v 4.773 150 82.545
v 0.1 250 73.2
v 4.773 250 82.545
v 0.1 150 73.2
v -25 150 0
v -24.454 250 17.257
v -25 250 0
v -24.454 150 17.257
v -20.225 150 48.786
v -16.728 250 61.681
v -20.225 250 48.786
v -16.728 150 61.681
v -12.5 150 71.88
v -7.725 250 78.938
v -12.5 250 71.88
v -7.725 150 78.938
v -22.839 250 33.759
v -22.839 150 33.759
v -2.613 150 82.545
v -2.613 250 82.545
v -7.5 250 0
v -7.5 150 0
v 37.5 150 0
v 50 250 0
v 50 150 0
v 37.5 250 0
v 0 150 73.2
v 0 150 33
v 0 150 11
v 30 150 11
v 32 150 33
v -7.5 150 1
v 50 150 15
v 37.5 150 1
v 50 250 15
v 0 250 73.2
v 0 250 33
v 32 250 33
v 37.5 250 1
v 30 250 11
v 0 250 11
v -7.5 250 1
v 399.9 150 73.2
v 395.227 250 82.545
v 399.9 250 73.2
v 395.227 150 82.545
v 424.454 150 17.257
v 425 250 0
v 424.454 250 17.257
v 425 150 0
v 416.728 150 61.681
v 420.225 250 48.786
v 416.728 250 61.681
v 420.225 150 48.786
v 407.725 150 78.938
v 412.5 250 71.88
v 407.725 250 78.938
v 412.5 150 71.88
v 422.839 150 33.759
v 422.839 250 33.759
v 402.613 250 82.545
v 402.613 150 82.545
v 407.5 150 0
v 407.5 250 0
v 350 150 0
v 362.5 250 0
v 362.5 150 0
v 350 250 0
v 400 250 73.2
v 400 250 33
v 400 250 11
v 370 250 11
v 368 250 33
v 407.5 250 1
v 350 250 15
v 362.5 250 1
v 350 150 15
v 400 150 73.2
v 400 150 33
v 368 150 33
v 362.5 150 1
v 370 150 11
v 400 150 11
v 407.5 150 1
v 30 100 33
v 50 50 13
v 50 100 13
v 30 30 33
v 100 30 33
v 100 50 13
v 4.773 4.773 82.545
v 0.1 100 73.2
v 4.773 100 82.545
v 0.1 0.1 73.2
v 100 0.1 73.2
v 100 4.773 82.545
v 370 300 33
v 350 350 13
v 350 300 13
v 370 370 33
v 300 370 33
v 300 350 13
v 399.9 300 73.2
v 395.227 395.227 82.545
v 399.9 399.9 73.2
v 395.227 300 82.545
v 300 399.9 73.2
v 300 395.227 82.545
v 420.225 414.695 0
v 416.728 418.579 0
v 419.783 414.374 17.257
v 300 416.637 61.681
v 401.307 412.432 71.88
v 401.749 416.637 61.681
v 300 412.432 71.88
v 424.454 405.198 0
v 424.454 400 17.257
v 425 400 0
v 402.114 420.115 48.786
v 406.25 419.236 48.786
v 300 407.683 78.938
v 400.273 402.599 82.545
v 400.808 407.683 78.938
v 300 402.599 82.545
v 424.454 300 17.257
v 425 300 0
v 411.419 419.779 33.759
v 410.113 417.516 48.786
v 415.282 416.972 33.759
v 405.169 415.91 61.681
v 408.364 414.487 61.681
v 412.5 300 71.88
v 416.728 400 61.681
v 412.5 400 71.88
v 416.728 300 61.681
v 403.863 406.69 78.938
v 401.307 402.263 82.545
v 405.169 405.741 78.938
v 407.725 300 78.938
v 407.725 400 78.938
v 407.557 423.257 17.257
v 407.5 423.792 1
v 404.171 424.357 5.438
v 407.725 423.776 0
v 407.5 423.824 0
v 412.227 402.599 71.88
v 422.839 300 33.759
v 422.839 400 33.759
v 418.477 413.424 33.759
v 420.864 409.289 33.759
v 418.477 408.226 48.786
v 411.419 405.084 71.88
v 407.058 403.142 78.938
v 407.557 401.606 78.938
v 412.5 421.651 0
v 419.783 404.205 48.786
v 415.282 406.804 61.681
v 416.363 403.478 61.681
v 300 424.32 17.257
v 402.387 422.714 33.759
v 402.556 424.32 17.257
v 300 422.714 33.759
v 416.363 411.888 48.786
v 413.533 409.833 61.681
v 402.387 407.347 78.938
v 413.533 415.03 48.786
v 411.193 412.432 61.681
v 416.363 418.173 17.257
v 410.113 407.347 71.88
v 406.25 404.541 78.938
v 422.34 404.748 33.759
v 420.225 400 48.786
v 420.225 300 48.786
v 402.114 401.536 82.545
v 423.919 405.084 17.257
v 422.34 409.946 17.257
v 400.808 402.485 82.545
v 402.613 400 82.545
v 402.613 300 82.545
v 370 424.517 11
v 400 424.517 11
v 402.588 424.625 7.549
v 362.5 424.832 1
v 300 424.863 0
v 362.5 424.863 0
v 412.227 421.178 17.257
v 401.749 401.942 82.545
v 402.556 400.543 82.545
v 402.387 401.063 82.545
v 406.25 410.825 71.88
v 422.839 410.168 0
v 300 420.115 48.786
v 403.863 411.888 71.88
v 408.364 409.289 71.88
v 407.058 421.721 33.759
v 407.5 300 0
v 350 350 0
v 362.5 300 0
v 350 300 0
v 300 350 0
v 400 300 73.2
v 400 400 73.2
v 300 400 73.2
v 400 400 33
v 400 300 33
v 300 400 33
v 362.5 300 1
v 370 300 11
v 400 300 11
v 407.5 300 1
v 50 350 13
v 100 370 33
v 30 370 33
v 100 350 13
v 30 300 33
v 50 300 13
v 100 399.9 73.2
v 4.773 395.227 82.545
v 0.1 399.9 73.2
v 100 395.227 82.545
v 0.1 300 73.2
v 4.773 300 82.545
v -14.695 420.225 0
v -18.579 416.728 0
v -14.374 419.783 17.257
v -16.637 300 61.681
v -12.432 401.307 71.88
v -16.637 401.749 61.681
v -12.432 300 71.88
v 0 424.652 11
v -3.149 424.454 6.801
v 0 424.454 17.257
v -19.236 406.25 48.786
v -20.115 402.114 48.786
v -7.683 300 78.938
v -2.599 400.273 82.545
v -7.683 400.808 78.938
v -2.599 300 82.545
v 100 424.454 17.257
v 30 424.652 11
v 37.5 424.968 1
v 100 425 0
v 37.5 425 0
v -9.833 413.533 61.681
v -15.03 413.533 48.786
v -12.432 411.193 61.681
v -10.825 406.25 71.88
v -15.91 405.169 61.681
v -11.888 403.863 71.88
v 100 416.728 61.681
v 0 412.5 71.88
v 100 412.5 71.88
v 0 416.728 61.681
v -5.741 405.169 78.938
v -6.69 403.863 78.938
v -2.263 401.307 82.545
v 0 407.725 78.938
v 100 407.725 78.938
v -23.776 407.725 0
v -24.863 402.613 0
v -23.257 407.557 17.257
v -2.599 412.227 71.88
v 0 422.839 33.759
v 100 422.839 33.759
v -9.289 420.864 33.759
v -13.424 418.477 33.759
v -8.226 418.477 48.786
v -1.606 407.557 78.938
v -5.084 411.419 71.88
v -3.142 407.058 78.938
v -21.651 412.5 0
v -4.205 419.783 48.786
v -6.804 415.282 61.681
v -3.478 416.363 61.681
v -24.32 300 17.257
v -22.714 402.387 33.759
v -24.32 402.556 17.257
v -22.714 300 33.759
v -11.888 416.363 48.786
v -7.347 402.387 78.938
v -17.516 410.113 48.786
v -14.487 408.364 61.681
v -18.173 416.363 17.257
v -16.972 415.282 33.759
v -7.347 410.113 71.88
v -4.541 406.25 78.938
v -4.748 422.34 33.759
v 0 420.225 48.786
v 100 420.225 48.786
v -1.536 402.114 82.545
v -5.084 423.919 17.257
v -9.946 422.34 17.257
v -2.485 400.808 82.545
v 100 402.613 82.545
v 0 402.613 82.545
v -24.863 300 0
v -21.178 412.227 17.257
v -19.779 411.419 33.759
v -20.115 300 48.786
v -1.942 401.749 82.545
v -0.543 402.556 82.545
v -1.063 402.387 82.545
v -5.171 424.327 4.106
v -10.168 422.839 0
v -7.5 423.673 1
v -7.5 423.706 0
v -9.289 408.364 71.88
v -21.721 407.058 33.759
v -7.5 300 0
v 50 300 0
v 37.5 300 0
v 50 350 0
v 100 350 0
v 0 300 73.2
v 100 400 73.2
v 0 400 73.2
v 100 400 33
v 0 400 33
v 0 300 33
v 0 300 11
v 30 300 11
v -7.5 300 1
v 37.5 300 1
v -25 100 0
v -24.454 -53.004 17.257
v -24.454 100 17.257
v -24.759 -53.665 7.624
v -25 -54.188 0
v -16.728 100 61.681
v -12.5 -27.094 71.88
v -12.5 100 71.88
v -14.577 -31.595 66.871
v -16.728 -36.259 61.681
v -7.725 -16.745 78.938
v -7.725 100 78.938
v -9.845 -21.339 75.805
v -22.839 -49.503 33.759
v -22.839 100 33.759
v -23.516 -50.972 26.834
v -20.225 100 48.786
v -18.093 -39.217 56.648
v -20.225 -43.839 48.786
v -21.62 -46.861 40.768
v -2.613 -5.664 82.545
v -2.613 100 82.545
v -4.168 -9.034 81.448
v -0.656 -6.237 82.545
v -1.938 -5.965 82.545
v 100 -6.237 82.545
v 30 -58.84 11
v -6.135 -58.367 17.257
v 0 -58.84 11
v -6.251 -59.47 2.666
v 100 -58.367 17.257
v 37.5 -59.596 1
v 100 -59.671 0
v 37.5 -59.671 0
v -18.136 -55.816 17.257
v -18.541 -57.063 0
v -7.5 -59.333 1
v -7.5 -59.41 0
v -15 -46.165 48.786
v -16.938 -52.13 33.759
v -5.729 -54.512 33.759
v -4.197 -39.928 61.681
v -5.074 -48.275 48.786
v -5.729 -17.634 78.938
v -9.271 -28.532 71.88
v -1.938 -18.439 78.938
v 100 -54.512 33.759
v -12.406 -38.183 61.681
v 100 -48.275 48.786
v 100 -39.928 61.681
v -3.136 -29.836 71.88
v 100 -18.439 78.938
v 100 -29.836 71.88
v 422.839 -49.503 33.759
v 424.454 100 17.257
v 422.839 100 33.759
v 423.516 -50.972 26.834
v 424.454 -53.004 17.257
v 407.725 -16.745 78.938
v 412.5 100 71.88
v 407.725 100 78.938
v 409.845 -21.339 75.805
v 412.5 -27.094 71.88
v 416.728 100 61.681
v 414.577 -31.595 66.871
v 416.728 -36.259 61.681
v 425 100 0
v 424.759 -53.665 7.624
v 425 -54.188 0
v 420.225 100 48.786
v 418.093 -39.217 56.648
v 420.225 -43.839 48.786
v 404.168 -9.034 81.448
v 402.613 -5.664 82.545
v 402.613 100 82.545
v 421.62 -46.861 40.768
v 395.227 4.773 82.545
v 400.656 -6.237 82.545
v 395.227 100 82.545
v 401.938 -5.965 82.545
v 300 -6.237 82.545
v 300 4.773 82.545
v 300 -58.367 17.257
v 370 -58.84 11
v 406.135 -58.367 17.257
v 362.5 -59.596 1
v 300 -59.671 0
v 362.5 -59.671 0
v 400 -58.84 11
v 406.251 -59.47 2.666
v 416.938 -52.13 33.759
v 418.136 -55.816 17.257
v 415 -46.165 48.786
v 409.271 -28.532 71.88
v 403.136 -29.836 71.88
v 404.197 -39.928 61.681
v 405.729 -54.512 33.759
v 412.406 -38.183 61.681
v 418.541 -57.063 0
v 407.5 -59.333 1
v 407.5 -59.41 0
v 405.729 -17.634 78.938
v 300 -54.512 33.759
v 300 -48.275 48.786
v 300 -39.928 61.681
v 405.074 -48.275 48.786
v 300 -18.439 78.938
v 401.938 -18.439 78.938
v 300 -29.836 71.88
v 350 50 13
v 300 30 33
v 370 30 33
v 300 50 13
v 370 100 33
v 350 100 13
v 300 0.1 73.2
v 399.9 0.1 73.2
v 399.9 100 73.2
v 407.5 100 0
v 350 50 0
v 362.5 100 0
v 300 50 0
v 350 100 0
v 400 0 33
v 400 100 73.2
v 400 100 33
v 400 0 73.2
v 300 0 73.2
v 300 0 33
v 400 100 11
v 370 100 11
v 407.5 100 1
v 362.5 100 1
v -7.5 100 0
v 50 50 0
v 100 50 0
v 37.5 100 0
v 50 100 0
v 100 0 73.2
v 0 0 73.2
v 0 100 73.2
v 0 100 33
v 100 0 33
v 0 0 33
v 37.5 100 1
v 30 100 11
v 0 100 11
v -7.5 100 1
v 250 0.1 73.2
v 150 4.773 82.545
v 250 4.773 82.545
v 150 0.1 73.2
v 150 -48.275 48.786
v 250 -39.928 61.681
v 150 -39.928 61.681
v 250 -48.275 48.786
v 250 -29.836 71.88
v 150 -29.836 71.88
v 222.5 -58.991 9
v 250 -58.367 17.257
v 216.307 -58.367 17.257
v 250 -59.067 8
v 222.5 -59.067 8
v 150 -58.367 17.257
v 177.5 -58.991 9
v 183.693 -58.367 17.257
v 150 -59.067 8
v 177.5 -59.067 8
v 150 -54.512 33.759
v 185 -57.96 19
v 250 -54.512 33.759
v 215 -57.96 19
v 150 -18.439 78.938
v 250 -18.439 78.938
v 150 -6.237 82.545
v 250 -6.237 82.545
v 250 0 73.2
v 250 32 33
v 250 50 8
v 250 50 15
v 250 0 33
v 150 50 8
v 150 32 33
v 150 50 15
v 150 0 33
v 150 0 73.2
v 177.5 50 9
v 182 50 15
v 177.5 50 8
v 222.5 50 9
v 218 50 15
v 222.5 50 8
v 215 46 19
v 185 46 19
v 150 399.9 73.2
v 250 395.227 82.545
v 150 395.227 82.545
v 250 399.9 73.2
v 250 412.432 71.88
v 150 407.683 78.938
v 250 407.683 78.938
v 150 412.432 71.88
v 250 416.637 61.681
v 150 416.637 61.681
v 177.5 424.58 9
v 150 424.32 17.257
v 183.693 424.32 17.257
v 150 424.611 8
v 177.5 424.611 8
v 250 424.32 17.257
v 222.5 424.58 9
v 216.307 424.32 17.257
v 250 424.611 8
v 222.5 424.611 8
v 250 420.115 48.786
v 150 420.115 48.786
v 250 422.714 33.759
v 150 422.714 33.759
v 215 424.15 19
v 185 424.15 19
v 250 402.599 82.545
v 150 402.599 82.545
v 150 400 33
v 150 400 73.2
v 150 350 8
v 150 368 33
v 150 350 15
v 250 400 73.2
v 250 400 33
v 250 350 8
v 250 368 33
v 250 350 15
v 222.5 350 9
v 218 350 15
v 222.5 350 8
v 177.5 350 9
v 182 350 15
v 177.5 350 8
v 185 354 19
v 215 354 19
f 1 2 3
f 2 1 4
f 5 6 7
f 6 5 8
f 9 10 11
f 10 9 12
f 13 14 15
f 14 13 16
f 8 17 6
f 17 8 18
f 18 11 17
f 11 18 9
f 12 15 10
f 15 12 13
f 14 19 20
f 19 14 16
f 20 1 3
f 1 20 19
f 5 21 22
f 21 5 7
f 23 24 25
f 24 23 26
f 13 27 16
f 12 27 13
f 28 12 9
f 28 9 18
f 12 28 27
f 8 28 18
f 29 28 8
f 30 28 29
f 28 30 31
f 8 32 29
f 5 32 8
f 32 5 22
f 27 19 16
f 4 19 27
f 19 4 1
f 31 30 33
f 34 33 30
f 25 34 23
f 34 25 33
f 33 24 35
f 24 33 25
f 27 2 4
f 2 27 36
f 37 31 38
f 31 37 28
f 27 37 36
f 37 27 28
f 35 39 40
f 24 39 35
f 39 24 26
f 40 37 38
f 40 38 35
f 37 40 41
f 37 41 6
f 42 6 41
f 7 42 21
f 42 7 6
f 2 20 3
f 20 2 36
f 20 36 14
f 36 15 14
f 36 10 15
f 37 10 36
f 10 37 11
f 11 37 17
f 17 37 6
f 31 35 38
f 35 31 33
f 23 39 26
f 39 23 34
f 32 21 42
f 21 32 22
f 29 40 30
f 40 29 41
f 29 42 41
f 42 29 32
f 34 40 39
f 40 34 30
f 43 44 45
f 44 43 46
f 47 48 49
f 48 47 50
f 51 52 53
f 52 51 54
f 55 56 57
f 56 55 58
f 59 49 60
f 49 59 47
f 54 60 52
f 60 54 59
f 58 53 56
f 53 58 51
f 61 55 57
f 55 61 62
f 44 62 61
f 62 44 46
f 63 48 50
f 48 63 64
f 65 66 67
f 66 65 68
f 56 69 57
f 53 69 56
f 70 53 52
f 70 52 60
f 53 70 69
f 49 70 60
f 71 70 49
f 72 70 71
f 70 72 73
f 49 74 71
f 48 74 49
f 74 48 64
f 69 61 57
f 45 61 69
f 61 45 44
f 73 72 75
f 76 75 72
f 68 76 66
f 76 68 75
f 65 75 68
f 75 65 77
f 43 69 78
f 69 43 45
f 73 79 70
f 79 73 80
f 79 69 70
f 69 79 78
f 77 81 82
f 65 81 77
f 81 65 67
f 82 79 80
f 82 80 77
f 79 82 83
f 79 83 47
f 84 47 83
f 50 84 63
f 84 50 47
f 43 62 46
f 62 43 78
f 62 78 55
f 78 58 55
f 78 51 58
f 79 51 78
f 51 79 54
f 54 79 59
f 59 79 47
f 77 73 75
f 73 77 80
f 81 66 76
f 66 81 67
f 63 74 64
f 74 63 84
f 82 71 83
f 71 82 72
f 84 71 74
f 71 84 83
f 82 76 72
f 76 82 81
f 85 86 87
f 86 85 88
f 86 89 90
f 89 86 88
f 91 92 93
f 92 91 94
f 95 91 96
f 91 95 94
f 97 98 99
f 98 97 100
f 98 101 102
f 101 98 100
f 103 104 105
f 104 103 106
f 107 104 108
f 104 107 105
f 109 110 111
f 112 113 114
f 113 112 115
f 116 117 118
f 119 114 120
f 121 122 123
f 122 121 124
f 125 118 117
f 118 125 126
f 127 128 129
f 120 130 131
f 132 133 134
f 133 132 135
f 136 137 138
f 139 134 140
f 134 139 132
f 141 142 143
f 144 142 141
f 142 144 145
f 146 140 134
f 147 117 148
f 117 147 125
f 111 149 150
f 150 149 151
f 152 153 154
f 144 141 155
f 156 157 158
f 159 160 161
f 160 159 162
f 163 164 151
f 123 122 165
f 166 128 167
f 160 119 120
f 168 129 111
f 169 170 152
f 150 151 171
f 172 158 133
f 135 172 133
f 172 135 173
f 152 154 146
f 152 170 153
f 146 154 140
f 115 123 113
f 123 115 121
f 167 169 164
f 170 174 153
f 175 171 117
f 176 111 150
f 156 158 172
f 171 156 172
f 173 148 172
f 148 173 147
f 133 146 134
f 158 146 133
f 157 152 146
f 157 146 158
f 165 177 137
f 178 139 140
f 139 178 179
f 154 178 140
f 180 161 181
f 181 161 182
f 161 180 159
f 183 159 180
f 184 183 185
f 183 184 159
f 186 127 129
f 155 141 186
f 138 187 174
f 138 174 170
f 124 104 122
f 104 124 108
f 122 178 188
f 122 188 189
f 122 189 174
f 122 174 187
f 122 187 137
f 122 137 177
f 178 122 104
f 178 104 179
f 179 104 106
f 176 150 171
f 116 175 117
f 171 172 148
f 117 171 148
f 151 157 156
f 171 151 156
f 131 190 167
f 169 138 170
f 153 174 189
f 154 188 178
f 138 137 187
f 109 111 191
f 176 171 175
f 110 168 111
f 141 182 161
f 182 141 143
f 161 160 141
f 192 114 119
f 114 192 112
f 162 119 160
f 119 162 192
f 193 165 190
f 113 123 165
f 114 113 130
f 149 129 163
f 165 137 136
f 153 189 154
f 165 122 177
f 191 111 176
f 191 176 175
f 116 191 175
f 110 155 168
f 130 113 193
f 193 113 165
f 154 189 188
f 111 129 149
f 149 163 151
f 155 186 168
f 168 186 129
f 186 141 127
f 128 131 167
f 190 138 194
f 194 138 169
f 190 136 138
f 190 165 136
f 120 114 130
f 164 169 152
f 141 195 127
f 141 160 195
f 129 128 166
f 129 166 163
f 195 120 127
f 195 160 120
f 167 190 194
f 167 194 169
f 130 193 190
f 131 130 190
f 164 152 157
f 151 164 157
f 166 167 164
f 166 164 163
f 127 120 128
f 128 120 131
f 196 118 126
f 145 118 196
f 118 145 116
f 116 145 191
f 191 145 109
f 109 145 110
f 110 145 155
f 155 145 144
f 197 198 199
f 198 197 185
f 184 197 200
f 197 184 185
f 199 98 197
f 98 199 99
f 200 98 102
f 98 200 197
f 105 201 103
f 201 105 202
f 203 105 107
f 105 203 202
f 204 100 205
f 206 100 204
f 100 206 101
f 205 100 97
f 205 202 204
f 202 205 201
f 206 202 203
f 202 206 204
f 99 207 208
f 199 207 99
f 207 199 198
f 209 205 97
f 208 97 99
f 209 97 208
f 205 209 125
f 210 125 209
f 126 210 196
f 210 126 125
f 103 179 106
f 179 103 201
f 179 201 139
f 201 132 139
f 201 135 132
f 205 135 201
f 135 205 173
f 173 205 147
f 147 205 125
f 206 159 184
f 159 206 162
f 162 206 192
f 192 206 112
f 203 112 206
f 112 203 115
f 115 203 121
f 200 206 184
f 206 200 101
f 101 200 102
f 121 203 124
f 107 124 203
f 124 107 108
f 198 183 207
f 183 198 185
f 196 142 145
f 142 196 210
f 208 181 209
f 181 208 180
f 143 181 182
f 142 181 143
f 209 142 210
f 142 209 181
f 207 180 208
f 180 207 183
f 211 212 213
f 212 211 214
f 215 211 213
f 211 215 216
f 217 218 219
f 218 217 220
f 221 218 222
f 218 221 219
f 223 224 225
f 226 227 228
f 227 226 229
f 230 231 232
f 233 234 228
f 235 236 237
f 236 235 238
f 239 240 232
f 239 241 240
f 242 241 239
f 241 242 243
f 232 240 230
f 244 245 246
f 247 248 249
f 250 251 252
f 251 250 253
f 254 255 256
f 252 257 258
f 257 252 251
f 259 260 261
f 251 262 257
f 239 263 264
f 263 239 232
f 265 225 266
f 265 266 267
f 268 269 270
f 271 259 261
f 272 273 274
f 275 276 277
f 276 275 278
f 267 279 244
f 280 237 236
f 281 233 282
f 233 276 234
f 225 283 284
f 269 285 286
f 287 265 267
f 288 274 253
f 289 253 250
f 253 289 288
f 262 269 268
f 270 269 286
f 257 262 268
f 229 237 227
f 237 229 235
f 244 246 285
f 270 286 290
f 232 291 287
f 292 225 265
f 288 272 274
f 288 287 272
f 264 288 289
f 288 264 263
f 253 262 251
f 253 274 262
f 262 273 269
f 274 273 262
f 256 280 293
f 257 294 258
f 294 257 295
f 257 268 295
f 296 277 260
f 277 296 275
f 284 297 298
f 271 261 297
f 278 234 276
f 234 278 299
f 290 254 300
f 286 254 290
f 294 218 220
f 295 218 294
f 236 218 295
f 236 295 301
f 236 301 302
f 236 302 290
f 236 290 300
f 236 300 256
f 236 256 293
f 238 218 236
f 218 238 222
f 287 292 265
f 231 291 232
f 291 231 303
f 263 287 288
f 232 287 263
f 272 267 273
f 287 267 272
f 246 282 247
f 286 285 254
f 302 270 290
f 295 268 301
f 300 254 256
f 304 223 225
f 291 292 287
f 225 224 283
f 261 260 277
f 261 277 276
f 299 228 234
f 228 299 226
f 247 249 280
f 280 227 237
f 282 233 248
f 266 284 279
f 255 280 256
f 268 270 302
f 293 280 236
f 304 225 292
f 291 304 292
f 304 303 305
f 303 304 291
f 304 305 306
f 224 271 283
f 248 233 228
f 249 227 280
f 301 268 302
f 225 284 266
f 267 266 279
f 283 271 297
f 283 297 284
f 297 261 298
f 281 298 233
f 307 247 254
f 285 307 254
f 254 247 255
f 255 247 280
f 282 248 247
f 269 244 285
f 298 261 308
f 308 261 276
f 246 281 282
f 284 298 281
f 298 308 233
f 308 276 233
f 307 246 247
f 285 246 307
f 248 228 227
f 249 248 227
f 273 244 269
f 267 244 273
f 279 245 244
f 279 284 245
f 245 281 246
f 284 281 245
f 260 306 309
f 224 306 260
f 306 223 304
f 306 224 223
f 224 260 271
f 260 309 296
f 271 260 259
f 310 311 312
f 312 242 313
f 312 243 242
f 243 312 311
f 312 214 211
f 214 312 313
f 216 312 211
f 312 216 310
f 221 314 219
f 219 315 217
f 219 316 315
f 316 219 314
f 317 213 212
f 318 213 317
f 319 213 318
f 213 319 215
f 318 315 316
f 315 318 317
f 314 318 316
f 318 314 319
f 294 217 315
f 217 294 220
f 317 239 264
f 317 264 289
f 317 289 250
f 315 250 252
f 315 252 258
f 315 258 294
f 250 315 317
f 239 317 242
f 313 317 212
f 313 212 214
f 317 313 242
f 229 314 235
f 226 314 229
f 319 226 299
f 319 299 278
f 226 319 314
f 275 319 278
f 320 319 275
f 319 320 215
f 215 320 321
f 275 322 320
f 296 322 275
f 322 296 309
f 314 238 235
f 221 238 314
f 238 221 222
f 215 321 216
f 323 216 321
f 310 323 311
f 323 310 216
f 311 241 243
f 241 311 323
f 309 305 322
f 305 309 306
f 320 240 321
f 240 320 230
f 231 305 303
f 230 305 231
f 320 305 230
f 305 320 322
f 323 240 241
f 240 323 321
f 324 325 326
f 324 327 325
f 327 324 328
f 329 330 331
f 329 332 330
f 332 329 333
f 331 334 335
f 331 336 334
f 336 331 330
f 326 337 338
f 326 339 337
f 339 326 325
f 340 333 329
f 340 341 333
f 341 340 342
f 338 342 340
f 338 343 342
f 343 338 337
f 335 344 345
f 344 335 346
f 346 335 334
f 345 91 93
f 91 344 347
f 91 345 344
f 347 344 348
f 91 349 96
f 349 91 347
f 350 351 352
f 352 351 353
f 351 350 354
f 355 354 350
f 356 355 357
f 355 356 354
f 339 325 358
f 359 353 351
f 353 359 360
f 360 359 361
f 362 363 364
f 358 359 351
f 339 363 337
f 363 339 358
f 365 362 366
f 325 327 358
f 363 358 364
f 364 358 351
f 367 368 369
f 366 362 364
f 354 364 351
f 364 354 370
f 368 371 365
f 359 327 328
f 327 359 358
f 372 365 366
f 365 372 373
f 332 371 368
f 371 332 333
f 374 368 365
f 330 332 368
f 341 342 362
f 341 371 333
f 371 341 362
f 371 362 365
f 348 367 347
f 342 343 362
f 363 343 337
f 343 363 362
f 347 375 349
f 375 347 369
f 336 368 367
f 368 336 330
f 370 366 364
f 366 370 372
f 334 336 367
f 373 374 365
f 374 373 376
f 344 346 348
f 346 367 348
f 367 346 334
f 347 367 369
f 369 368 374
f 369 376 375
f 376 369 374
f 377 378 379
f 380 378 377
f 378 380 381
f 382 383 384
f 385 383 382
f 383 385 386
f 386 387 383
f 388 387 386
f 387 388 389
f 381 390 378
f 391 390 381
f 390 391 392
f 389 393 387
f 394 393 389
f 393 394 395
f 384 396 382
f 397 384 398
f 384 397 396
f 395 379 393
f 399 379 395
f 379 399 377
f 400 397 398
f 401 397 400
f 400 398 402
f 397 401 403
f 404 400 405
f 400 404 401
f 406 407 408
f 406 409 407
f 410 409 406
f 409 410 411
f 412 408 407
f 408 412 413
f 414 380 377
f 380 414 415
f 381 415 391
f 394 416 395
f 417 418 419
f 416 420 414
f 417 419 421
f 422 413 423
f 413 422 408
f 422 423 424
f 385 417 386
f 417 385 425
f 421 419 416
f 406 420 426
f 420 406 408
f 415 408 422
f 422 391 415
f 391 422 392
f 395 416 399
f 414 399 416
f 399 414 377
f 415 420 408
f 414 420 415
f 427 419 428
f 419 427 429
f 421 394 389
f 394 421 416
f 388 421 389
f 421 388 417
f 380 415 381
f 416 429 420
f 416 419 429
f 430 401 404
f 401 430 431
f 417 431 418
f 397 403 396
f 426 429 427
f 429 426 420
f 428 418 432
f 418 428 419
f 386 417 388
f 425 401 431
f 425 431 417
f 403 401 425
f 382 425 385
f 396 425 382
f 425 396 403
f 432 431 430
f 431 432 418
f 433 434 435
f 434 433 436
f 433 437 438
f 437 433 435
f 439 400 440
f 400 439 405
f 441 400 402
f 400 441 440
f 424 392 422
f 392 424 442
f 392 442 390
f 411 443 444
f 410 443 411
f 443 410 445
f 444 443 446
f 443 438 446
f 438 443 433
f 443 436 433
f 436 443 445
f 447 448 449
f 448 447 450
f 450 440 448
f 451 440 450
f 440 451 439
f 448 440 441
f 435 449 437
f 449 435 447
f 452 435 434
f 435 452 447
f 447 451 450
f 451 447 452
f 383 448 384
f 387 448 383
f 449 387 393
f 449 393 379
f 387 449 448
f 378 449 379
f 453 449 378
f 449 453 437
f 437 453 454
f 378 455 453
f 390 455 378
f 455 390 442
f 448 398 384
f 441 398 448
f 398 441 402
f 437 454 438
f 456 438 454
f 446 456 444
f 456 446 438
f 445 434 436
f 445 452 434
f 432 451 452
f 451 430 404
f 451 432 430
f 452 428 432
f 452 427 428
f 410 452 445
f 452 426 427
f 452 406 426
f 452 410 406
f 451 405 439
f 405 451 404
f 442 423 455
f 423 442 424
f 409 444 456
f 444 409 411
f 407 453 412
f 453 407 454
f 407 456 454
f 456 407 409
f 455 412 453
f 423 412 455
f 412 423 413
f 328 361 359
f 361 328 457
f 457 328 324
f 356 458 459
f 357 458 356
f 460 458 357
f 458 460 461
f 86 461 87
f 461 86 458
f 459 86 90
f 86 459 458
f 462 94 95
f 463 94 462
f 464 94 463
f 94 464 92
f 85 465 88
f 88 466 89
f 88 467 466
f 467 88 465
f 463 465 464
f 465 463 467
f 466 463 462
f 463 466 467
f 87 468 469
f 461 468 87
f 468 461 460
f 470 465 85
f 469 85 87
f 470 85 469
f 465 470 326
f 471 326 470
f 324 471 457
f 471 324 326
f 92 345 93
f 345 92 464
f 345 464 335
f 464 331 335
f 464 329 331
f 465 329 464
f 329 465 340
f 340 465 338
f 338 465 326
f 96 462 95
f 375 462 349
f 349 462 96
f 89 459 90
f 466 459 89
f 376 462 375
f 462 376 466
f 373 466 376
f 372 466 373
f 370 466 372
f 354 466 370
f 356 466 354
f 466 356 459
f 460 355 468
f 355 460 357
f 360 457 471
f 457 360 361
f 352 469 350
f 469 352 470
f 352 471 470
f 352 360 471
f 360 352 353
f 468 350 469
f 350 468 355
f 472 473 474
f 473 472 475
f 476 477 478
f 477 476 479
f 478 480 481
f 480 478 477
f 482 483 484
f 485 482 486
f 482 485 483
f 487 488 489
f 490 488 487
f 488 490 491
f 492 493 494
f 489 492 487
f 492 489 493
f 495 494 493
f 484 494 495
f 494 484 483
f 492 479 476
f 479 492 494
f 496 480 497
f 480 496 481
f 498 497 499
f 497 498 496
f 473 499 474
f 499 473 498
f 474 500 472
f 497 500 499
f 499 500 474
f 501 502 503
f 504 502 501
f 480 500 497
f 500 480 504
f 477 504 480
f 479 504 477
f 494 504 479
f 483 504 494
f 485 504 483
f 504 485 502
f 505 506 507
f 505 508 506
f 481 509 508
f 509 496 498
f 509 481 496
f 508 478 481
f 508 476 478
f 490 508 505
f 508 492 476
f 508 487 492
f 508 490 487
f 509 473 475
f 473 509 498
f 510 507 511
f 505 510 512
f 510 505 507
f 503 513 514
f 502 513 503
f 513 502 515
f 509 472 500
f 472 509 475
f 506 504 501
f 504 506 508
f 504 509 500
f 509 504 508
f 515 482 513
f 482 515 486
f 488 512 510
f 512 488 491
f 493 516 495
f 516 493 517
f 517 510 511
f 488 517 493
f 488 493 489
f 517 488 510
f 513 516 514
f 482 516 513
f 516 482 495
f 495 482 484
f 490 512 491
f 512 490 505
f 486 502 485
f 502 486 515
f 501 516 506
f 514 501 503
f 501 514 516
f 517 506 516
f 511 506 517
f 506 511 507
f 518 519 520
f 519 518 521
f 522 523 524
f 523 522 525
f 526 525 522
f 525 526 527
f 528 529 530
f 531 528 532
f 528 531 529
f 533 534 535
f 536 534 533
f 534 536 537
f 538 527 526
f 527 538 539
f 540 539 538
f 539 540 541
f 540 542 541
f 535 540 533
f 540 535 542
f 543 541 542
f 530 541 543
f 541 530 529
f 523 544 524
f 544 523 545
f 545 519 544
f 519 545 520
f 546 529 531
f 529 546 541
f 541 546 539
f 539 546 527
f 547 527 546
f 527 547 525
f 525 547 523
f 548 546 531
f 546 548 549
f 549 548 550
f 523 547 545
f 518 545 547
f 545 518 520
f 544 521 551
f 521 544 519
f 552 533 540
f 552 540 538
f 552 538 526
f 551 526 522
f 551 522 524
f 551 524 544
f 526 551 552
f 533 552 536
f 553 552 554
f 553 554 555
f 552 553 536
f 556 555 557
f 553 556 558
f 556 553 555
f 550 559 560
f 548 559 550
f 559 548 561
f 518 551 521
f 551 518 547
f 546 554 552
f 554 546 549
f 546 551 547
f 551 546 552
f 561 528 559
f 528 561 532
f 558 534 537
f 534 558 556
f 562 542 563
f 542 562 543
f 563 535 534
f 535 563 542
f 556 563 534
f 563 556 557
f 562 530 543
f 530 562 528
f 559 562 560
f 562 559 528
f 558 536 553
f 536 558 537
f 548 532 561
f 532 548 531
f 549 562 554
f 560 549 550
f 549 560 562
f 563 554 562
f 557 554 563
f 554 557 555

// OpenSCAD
$fn = 30; 
include <MCAD/2Dshapes.scad>;

preview_maly ();
//preview ();
//strana ();
//predek ();
//zadek ();
//predni_roh_P ();
//predni_roh_L ();
//zadni_roh_P ();
//zadni_roh_L ();

module preview_maly () {
	translate ([0, 150, 0]) strana ();
	translate ([400, 250, 0]) rotate ([0, 0, 180]) strana ();
	translate ([400, 400, 0]) rotate ([0, 0, 180])   zadni_roh_P ();
	translate ([0,400, 0]) zadni_roh_L ();
	translate ([400, 0, 0]) predni_roh_P ();
	predni_roh_L(); 
	translate ([200, 0, 0]) predek ();
	translate ([200, 400, 0]) rotate ([0, 0, 180]) zadek ();
}
module preview () {
	translate ([960, 0, 0]) %vyrez_podlahy ();
	%vyrez_podlahy ();
	translate ([0,0,33]) solar ();
	translate ([0, 800, 0]) strana ();
	translate ([990, 900, 0]) rotate ([0, 0, 180]) strana ();
	translate ([990, 1650, 0]) rotate ([0, 0, 180])   zadni_roh_P ();
	translate ([0,1650, 0]) zadni_roh_L ();
	translate ([990, 0, 0]) predni_roh_P ();
	predni_roh_L(); 
	translate ([445, 0, 0]) predek ();
	translate ([445, 1650, 0]) rotate ([0, 0, 180]) zadek ();
}

module prism(l, w, h){						// Rutina k vytvoreni klinu
       polyhedron(
               points=[[0,0,0], [l,0,0], [l,w,0], [0,w,0], [0,w,h], [l,w,h]],
               faces=[[0,1,2,3],[5,4,3,2],[0,4,5,1],[0,3,4],[5,2,1]]
               );
}

module solar () {
	 %cube ([990, 1650, 40]);
}

module vyrez_podlahy () {
	translate ([0, 1720]) rotate ([90, 0, 0]) linear_extrude (1800) 
		difference () {
			hull () {
				square ([30, 10]);
				translate ([-7.5, -10]) square ([45, 10]);
			}
			translate ([-7.5, -12]) square ([45, 10]);
		}
}

module strana () {
	difference () {
		translate ([0, 0, -10]) minkowski () {
			rotate_extrude () ellipsePart (50, 166,2);
			cube ([200,  200, 10]);
		}
		translate ([0,0,-250]) cube (500, true);
		translate ([-50,-50,-10]) cube ([300, 50, 100]);
		translate ([50,-10,-10]) cube ([300, 300, 100]);
		translate ([0,-10,33]) cube ([60, 300, 40.2]);
		translate ([-100,100,-10]) cube (300);
		translate ([1,-50,64]) rotate ([0, 45, 0])  cube ([100, 200, 100]);

		translate ([0, -10, 73]) union () {
		 translate ([5,0,0]) cube (200);
		 mirror ([1,0,0]) rotate (90) prism (200, 10, 20);
		}
		translate ([0, 0, 1]) vyrez_podlahy ();
	}
}

module zadek () {
	difference () {
		translate ([-100, 0, 0]) 
			translate ([0,0,-10]) minkowski () {
				rotate_extrude () ellipsePart (50, 166,2);
				cube ([200,  200, 10]);
			}
		translate ([350, 0, 0]) cube (600, center=true);
		translate ([-350, 0, 0]) cube (600, center=true);
		translate ([0, 0, -300]) cube (600, center=true);
		translate ([0, 350, 0]) cube (600, center=true);
		translate ([-60,0,33]) cube ([120, 60, 40.2]);
		translate ([100, 0, 0]) rotate ([0, 0, 90]) translate ([0, -10, 73]) union () {
			translate ([5,0,0]) cube (200);
			mirror ([1,0,0]) rotate (90) prism (200, 10, 20);
		}
		translate ([-15, 0, 9]) vyrez_podlahy ();
		cube ([200, 200, 16], center=true);
		translate ([60, 1, 64]) rotate ([0, 45, 90])  cube ([100, 200, 100]);
	}
}

module predek () {
	difference () {
		translate ([-100, 0, 0]) 
			translate ([0,0,-10]) minkowski () {
				rotate_extrude () ellipsePart (120, 166,2);
				cube ([200,  200, 10]);
			}
		translate ([350, 0, 0]) cube (600, center=true);
		translate ([-350, 0, 0]) cube (600, center=true);
		translate ([0, 0, -300]) cube (600, center=true);
		translate ([0, 350, 0]) cube (600, center=true);
		translate ([-60,0,33]) cube ([120, 60, 40.2]);
		translate ([100, 0, 0]) rotate ([0, 0, 90]) translate ([0, -10, 73]) union () {
			translate ([5,0,0]) cube (200);
			mirror ([1,0,0]) rotate (90) prism (200, 10, 20);
		}
		translate ([-15, 0, 9]) vyrez_podlahy ();
		cube ([200, 200, 16], center=true);
		translate ([60, 1, 64]) rotate ([0, 45, 90])  cube ([100, 200, 100]);
	}
}

module predni_roh_P () {
	difference () {
		translate ([-200, 0, 0]) intersection () {
			translate ([0,-100,-10]) minkowski () {
				rotate_extrude () ellipsePart (50, 166,2);
				cube ([200,  200, 10]);
			}
			translate ([0,0,-10]) minkowski () {
				rotate_extrude () ellipsePart (120, 166,2);
				cube ([200,  200, 10]);
			}
		}
		translate ([0,0,-250]) cube (500, true);
		translate ([-350,50,-10]) cube ([300, 300, 100]);
		translate ([-300,0,33]) cube ([300, 300, 40.2]);
		translate ([-100,100,-10]) cube (200);
		rotate (90) translate ([-100,100,-10]) cube (200);
		translate ([-30, 0, 1]) vyrez_podlahy ();
		translate ([-1, 50, 64]) rotate ([0, -135, 0])  cube ([100, 100, 100]);
		translate ([-50,1,64]) rotate ([0, 45,90])  cube ([100, 100, 100]);
		rotate ([0, 0, 90]) translate ([30, 30, 33]) intersection () {
			translate ([0,0,0]) rotate ([0, 45, 0])  cube ([100, 100, 100]);
			translate ([100,0,0]) rotate ([0, 45,90])  cube ([100, 100, 100]);
		}
		rotate ([0, 0,  90]) intersection () {
			translate ([0, 0, 73]) union () {
			 translate ([5,0,0]) cube ([110, 110, 10]);
			 mirror ([1,0,0]) rotate (90) prism (110, 10, 20);
			}
			translate ([110, 0, 0]) rotate (90) translate ([0, 0, 73]) union () {
			 translate ([5,0,0]) cube ([110, 110, 10]);
			 mirror ([1,0,0]) rotate (90) prism (110, 10, 20);
			}
		}
	}
}
module predni_roh_L () {
	difference () {
		intersection () {
			translate ([0,-100,-10]) minkowski () {
				rotate_extrude () ellipsePart (50, 166,2);
				cube ([200,  200, 10]);
			}
			translate ([0,0,-10]) minkowski () {
				rotate_extrude () ellipsePart (120, 166,2);
				cube ([200,  200, 10]);
			}
		}
		translate ([0,0,-250]) cube (500, true);
		translate ([50,50,-10]) cube ([300, 300, 100]);
		translate ([0,0,33]) cube ([300, 300, 40.2]);
		translate ([-100,100,-10]) cube (200);
		rotate (-90) translate ([-100,100,-10]) cube (200);
		translate ([0, 0, 1]) vyrez_podlahy ();
		translate ([1,50,64]) rotate ([0, 45, 0])  cube ([100, 100, 100]);
		translate ([150,1,64]) rotate ([0, 45,90])  cube ([100, 100, 100]);
		translate ([30, 30, 33]) intersection () {
			translate ([0,0,0]) rotate ([0, 45, 0])  cube ([100, 100, 100]);
			translate ([100,0,0]) rotate ([0, 45,90])  cube ([100, 100, 100]);
		}
		intersection () {
			translate ([0, 0, 73]) union () {
			 translate ([5,0,0]) cube ([110, 110, 10]);
			 mirror ([1,0,0]) rotate (90) prism (110, 10, 20);
			}
			translate ([110, 0, 0]) rotate (90) translate ([0, 0, 73]) union () {
			 translate ([5,0,0]) cube ([110, 110, 10]);
			 mirror ([1,0,0]) rotate (90) prism (110, 10, 20);
			}
		}
	}
}

module  zadni_roh_L () {
	difference () {
		rotate ([0, 0, -90]) difference () {
			translate ([0,0,-10]) minkowski () {
				rotate_extrude () ellipsePart (50, 166,2);
				cube ([200,  200, 10]);
			}
			translate ([0,0,-250]) cube (500, true);
			translate ([50,50,-10]) cube ([300, 300, 100]);
			translate ([0,0,33]) cube ([300, 300, 40.2]);
			translate ([-100,100,-10]) cube (200);
			rotate (-90) translate ([-100,100,-10]) cube (200);

			translate ([1,50,64]) rotate ([0, 45, 0])  cube ([100, 100, 100]);
			translate ([150,1,64]) rotate ([0, 45,90])  cube ([100, 100, 100]);
			translate ([30, 30, 33]) intersection () {
				translate ([0,0,0]) rotate ([0, 45, 0])  cube ([100, 100, 100]);
				translate ([100,0,0]) rotate ([0, 45,90])  cube ([100, 100, 100]);
			}
			intersection () {
				translate ([0, 0, 73]) union () {
				 translate ([5,0,0]) cube ([110, 110, 10]);
				 mirror ([1,0,0]) rotate (90) prism (110, 10, 20);
				}
				translate ([110, 0, 0]) rotate (90) translate ([0, 0, 73]) union () {
				 translate ([5,0,0]) cube ([110, 110, 10]);
				 mirror ([1,0,0]) rotate (90) prism (110, 10, 20);
				}
			}
		}
		translate ([0, -110, 1]) vyrez_podlahy ();
	}
}

module  zadni_roh_P () {
	difference () {
		translate ([0,0,-10]) minkowski () {
			rotate_extrude () ellipsePart (50, 166,2);
			cube ([200,  200, 10]);
		}
		translate ([0,0,-250]) cube (500, true);
		translate ([50,50,-10]) cube ([300, 300, 100]);
		translate ([0,0,33]) cube ([300, 300, 40.2]);
		translate ([-100,100,-10]) cube (200);
		rotate (-90) translate ([-100,100,-10]) cube (200);
		translate ([0, 0, 1]) vyrez_podlahy ();

		translate ([1,50,64]) rotate ([0, 45, 0])  cube ([100, 100, 100]);
		translate ([150,1,64]) rotate ([0, 45,90])  cube ([100, 100, 100]);
		translate ([30, 30, 33]) intersection () {
			translate ([0,0,0]) rotate ([0, 45, 0])  cube ([100, 100, 100]);
			translate ([100,0,0]) rotate ([0, 45,90])  cube ([100, 100, 100]);
		}
		intersection () {
			translate ([0, 0, 73]) union () {
			 translate ([5,0,0]) cube ([110, 110, 10]);
			 mirror ([1,0,0]) rotate (90) prism (110, 10, 20);
			}
			translate ([110, 0, 0]) rotate (90) translate ([0, 0, 73]) union () {
			 translate ([5,0,0]) cube ([110, 110, 10]);
			 mirror ([1,0,0]) rotate (90) prism (110, 10, 20);
			}
		}
	}
}
